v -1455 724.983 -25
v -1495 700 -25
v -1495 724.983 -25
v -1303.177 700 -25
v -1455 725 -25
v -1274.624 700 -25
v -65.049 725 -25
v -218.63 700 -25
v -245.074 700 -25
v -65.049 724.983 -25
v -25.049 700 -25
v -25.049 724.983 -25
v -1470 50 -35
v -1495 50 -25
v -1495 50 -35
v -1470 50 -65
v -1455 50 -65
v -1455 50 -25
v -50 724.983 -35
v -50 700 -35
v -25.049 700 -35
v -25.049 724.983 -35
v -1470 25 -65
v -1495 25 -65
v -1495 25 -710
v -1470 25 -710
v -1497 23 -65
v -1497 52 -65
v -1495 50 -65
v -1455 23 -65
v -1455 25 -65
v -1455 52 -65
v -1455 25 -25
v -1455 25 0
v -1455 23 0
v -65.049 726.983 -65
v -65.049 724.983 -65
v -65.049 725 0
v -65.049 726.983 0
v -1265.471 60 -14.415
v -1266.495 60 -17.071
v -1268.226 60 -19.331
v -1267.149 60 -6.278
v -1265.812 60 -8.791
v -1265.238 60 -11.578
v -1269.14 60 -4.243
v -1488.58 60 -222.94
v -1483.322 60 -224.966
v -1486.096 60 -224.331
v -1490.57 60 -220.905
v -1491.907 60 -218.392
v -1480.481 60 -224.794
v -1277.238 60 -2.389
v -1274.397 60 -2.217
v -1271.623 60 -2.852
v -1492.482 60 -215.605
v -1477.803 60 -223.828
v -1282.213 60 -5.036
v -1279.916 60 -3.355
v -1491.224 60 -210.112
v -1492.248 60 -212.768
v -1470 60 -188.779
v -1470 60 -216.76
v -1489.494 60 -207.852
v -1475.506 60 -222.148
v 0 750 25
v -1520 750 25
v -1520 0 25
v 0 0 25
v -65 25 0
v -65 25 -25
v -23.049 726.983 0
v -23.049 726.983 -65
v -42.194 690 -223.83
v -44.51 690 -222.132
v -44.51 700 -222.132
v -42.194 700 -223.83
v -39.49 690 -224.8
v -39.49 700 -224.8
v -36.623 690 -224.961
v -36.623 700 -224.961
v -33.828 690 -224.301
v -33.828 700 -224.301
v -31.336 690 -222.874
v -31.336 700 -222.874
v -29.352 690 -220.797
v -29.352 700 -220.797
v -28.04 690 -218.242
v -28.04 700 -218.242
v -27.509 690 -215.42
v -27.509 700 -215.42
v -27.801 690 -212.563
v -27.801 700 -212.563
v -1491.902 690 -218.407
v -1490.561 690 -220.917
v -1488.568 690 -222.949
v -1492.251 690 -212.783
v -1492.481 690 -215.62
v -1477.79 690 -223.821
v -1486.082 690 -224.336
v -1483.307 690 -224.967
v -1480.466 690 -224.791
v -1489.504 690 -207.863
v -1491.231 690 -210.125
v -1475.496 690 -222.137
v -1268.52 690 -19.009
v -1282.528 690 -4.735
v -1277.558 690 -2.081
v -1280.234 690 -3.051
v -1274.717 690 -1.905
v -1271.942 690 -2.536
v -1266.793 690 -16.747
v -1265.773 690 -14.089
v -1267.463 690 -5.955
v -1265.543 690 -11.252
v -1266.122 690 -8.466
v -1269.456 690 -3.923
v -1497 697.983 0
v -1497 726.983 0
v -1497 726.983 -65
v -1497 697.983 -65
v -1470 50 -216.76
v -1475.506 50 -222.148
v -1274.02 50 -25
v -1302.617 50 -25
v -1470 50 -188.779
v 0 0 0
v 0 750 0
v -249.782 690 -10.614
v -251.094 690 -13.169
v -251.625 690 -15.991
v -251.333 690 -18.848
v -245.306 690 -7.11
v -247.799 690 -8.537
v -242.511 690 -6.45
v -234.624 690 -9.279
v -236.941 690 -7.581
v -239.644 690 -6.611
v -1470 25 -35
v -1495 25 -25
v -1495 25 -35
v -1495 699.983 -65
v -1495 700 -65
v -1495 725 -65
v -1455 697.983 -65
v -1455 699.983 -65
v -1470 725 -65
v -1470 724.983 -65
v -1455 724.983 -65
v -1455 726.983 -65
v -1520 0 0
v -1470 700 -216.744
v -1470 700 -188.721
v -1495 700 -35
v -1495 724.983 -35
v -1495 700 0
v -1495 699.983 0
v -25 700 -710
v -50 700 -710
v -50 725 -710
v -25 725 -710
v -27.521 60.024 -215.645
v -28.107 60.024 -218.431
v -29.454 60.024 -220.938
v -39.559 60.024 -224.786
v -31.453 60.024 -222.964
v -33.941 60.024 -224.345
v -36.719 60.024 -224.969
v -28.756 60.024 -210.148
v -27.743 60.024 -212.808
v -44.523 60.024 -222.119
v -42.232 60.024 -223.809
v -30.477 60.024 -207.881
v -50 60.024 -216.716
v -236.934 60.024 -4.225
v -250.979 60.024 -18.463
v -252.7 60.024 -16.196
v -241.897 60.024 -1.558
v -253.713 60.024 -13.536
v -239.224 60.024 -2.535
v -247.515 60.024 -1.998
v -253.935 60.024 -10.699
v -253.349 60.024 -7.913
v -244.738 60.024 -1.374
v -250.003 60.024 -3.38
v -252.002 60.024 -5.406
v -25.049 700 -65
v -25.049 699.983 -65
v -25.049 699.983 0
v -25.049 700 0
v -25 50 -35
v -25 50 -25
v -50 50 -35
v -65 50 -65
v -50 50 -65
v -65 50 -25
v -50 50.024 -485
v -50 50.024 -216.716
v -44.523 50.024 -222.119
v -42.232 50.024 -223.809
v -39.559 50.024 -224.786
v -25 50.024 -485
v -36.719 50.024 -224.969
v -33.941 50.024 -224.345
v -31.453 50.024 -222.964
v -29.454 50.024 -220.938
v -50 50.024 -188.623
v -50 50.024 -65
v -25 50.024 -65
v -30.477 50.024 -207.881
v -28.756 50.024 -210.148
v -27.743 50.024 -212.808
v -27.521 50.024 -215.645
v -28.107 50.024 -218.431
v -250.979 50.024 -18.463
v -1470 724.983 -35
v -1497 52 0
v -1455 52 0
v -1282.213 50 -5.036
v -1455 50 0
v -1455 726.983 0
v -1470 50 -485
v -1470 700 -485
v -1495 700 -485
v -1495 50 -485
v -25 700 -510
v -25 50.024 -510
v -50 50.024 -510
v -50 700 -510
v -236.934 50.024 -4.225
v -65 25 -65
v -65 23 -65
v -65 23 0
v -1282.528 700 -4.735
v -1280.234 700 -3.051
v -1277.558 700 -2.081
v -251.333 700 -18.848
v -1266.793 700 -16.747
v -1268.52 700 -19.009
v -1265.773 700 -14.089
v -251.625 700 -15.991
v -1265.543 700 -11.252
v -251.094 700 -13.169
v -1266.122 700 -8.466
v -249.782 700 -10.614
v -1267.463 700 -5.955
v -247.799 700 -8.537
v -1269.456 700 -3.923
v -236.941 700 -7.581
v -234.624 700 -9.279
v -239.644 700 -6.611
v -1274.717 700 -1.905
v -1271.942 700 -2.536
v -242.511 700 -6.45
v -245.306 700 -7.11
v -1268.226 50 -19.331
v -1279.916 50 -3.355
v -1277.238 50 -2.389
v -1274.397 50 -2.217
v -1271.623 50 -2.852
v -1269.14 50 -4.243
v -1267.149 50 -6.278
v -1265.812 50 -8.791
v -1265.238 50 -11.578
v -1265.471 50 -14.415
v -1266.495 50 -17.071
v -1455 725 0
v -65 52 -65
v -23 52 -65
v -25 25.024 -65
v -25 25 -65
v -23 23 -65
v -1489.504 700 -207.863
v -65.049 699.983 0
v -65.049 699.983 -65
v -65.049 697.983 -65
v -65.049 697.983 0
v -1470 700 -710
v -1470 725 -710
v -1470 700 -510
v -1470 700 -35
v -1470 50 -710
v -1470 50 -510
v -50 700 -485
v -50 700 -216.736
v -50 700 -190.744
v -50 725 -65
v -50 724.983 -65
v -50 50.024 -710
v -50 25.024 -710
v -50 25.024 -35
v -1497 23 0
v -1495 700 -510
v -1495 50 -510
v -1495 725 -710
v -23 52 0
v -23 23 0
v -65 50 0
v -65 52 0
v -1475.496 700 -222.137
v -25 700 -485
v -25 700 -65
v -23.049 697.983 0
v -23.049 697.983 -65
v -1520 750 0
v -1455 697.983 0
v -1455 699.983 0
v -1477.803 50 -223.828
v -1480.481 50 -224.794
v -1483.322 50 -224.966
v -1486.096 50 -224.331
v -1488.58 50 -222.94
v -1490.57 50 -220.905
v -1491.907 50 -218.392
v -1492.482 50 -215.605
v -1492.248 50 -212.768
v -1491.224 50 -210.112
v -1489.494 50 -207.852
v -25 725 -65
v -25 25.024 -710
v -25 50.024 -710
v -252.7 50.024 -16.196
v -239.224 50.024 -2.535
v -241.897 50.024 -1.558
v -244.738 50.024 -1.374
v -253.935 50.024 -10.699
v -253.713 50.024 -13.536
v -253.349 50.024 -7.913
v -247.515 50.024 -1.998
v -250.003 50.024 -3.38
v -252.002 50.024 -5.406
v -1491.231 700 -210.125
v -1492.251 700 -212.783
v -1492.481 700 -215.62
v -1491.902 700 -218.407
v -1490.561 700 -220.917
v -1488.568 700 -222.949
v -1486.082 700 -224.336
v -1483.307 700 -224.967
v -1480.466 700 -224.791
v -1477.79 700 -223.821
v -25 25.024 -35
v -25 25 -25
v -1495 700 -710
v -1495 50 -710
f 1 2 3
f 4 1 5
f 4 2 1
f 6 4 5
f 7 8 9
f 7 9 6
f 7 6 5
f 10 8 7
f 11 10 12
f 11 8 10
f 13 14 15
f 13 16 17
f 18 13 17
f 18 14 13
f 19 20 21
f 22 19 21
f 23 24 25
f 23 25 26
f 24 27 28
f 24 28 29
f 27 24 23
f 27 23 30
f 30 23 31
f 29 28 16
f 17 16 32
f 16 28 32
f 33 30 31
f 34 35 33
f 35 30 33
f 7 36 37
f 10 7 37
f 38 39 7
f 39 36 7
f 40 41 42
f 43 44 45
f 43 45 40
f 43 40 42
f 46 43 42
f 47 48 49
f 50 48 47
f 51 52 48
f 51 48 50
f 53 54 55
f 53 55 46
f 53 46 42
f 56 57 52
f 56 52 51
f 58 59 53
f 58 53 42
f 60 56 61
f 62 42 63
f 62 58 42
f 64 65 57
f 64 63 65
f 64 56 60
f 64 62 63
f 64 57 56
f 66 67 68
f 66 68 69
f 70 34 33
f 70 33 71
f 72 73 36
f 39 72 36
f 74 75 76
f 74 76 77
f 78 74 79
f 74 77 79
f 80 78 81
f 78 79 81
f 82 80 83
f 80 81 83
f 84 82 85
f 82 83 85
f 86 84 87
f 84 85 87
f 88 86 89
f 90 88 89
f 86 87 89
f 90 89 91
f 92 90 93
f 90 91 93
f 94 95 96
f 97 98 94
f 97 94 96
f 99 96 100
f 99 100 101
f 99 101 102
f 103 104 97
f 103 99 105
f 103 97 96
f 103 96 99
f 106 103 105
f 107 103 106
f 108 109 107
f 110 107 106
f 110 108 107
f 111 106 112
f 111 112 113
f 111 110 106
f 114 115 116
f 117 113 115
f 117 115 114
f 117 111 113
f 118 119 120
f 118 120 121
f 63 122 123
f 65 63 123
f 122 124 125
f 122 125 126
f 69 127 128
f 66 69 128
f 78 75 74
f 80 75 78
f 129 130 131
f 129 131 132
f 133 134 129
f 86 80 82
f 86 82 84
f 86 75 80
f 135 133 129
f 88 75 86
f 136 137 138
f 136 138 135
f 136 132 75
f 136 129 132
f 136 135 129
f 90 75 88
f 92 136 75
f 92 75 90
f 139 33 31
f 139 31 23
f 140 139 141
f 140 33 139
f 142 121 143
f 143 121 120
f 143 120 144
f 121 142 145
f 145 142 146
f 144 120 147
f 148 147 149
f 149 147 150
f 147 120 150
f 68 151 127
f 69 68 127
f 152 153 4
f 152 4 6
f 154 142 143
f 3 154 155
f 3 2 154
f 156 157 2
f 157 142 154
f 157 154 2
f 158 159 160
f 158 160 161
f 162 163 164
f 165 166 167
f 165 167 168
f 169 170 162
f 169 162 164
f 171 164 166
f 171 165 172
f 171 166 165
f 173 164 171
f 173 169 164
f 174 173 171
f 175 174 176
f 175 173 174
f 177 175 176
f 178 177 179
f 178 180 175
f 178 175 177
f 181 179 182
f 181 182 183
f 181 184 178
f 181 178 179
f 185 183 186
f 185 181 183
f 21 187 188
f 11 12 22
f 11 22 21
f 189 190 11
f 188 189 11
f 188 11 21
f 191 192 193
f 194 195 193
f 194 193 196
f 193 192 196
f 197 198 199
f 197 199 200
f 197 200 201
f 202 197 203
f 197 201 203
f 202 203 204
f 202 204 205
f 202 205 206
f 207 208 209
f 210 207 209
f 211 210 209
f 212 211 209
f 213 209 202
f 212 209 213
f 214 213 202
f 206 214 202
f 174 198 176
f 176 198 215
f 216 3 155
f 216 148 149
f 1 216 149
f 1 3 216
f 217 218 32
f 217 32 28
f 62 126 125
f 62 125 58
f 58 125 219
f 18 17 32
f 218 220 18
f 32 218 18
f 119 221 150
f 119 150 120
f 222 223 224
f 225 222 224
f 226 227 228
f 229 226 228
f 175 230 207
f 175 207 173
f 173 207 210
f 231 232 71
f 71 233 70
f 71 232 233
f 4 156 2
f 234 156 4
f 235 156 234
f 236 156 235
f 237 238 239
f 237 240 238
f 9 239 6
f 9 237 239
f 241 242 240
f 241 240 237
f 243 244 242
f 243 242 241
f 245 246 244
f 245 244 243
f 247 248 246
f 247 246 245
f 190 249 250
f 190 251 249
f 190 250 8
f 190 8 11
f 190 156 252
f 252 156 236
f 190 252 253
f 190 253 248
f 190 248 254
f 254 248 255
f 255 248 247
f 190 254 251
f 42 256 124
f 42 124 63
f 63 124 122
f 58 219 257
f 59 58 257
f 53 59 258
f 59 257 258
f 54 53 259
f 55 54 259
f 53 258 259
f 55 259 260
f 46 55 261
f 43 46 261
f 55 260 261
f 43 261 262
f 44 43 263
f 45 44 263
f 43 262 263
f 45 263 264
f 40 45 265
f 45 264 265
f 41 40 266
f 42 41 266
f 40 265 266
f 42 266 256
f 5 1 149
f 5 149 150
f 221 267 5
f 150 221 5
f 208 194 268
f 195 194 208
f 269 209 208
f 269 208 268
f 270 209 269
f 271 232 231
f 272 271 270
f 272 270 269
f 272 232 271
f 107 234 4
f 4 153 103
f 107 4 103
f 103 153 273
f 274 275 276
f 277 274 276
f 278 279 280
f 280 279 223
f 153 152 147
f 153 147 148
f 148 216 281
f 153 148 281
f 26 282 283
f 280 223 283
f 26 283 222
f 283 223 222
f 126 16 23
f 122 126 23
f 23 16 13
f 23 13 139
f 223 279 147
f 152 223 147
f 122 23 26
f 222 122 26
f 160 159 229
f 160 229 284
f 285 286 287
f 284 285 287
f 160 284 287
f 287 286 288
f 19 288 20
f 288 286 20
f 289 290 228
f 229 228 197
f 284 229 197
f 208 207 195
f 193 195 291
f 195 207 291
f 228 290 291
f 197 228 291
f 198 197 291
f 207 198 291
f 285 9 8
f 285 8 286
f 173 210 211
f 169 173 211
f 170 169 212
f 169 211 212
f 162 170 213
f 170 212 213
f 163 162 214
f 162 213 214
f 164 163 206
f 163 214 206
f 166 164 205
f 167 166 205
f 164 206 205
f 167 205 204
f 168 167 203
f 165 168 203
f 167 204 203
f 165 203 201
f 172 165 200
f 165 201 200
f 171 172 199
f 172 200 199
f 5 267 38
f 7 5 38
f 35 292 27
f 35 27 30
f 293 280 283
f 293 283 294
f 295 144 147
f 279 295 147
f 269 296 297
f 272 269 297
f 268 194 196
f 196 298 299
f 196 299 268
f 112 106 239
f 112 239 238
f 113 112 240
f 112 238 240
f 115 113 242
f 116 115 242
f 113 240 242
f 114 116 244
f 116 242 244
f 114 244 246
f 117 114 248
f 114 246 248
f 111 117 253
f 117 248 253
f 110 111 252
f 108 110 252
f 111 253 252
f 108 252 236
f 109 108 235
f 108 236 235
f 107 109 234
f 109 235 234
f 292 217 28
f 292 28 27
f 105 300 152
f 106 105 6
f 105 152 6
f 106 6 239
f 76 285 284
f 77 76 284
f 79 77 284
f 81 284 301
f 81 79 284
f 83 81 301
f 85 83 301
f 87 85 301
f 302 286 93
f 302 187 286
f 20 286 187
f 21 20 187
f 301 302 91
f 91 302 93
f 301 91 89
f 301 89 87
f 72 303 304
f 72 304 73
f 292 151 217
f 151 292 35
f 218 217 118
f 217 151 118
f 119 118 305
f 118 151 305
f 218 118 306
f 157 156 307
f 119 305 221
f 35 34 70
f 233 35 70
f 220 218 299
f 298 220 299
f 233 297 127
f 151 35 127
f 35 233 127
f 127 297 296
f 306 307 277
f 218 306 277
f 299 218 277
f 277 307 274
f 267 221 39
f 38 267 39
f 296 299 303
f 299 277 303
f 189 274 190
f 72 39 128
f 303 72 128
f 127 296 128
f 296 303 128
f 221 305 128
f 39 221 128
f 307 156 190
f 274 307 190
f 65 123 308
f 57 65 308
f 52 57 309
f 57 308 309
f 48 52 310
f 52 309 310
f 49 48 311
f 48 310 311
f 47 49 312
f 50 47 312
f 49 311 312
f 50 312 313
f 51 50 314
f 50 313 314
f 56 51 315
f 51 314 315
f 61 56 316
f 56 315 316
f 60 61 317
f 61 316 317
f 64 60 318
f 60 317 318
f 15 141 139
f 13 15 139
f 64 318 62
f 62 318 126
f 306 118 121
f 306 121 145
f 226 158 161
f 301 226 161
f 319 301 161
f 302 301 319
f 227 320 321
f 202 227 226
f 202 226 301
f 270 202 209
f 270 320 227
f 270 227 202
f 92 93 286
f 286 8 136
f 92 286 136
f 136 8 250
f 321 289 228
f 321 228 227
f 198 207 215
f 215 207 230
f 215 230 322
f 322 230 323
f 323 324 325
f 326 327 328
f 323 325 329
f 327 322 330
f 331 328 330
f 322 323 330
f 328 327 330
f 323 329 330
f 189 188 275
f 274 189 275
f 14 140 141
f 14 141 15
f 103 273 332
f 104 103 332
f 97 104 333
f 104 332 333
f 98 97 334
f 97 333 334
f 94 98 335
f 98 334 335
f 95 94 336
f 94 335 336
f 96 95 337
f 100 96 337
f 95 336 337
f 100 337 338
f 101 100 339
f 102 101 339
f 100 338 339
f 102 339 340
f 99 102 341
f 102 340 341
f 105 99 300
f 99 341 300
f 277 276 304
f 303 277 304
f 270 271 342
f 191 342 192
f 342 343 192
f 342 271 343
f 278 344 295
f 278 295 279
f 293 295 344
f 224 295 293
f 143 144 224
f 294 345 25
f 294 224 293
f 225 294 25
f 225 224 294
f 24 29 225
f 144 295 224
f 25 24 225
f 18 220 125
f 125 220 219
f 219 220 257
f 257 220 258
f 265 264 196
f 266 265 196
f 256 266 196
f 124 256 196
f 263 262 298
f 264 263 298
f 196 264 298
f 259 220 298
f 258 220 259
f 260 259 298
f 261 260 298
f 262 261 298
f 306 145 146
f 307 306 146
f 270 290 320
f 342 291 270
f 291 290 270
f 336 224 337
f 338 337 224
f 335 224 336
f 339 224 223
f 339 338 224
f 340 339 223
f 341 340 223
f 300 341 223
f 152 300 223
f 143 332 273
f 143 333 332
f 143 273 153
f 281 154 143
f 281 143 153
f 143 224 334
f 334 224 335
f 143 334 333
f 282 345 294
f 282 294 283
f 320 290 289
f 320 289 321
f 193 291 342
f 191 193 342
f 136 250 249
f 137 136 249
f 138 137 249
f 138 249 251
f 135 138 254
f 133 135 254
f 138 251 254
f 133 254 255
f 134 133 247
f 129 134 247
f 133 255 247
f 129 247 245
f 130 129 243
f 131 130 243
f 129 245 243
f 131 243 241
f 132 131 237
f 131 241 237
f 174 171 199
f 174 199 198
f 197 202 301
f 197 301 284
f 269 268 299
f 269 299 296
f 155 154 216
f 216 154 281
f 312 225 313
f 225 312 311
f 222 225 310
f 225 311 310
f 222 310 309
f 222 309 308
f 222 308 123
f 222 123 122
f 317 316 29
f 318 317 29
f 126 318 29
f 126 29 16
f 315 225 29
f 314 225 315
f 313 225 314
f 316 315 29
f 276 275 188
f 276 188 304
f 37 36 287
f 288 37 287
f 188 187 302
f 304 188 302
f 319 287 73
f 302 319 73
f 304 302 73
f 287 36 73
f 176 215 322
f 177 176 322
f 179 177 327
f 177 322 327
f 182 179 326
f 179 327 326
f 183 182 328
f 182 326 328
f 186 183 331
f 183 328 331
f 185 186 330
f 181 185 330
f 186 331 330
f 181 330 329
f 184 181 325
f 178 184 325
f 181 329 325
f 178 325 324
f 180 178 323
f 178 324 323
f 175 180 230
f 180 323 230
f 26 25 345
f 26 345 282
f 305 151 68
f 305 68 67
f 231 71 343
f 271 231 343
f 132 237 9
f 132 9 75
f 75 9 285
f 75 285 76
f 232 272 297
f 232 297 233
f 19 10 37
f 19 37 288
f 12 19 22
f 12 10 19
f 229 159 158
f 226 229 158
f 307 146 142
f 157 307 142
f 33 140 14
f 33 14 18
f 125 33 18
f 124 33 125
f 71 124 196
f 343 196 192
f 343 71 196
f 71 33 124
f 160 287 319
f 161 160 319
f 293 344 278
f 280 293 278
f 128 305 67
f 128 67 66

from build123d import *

# Parameters (mm, degrees)
F0_W      = 1520
F0_H      = 750
F1_DEPTH  = 25
F2_W      = 1470
F2_H      = 25
F3_DEPTH  = 25
F5_DEPTH  = 65
F7_W      = 25
F7_H      = 25
F8_DEPTH  = 675
F10_DEPTH = 65
F12_W     = 25
F12_H     = 25
F13_DEPTH = 675
F15_W     = 25
F15_H     = 25
F16_DEPTH = 675
F18_W     = 25
F18_H     = 25
F19_DEPTH = 650
F21_W     = 25
F21_H     = 25
F22_DEPTH = 650
F24_DEPTH = 10
F26_DEPTH = 10
F29_DEPTH = 10
F31_DEPTH = 10


with BuildPart() as f1:
    # F0 (on Top) → F1 (new body)
    with BuildSketch(Plane.XY):
        with Locations((-760, 375)):
            Rectangle(F0_W, F0_H)
    extrude(amount=F1_DEPTH)

    # F2 (on face) → F3 (join)
    with BuildSketch(Plane(origin=(0, 0, 0), x_dir=(1, 0, 0), z_dir=(0, 0, -1))):
        with Locations((-760, -37.5)):
            Rectangle(F2_W, F2_H)
        with Locations((-760, -712.5)):
            Rectangle(F2_W, F2_H)
    extrude(amount=F3_DEPTH)

    # F4 (on face) → F5 (join)
    with BuildSketch(Plane(origin=(0, 0, 0), x_dir=(1, 0, 0), z_dir=(0, 0, -1))):
        Polygon((-65, -25), (-25, -25), (-25, -50), (-65, -50), (-65, -52), (-23, -52), (-23, -23), (-65, -23), align=None)
    extrude(amount=F5_DEPTH)

    # F7 (on offset) → F8 (join)
    with BuildSketch(Plane(origin=(0, 0, -35), x_dir=(1, 0, 0), z_dir=(0, 0, -1))):
        with Locations((-37.5, -37.523640207)):
            Rectangle(F7_W, F7_H)
    extrude(amount=F8_DEPTH)

    # F9 (on face) → F10 (join)
    with BuildSketch(Plane.XY):
        Polygon((-1495, 724.9829173088), (-1455, 724.9829173088), (-1455, 726.9829173088), (-1497, 726.9829173088), (-1497, 697.9829173088), (-1455, 697.9829173088), (-1455, 699.9829173088), (-1495, 699.9829173088), align=None)
        Polygon((-65.0490959734, 726.9829173088), (-65.0490959734, 724.9829173088), (-25.0490959734, 724.9829173088), (-25.0490959734, 699.9829173088), (-65.0490959734, 699.9829173088), (-65.0490959734, 697.9829173088), (-23.0490959734, 697.9829173088), (-23.0490959734, 726.9829173088), align=None)
        Polygon((-1455, 25), (-1495, 25), (-1495, 50), (-1455, 50), (-1455, 52), (-1497, 52), (-1497, 23), (-1455, 23), align=None)
    extrude(amount=-F10_DEPTH)

    # F12 (on offset) → F13 (join)
    with BuildSketch(Plane(origin=(0, 0, -35), x_dir=(1, 0, 0), z_dir=(0, 0, -1))):
        with Locations((-1482.5, -37.5)):
            Rectangle(F12_W, F12_H)
    extrude(amount=F13_DEPTH)

    # F15 (on offset) → F16 (join)
    with BuildSketch(Plane(origin=(0, 0, -35), x_dir=(1, 0, 0), z_dir=(0, 0, -1))):
        with Locations((-37.5, -712.5)):
            Rectangle(F15_W, F15_H)
        with Locations((-1482.5, -712.5)):
            Rectangle(F15_W, F15_H)
    extrude(amount=F16_DEPTH)

    # F18 (on offset) → F19 (join)
    with BuildSketch(Plane(origin=(0, 50.023640207, 0), x_dir=(-1, 0, 0), z_dir=(0, 1, 0))):
        with Locations((37.5, -497.5)):
            Rectangle(F18_W, F18_H)
    extrude(amount=F19_DEPTH)

    # F21 (on offset) → F22 (join)
    with BuildSketch(Plane(origin=(0, 50, 0), x_dir=(-1, 0, 0), z_dir=(0, 1, 0))):
        with Locations((1482.5, -497.5)):
            Rectangle(F21_W, F21_H)
    extrude(amount=F22_DEPTH)

    # F23 (on face) → F24 (join)
    with BuildSketch(Plane.XZ.offset(-700)):
        with BuildLine():
            Line((-50, -190.7444713597), (-234.6244849475, -9.2794851613))
            ThreePointArc((-234.6244849475, -9.2794851613), (-246.6039118675, -7.7336055545), (-251.332803081, -18.8481906111))
            Line((-251.332803081, -18.8481906111), (-50, -216.7355636904))
            Line((-50, -216.7355636904), (-50, -190.7444713597))
        make_face()
        with BuildLine():
            Line((-27.8014624786, -212.5631229112), (-50, -190.7444713597))
            Line((-50, -190.7444713597), (-50, -216.7355636904))
            Line((-50, -216.7355636904), (-44.5097806121, -222.131828361))
            ThreePointArc((-44.5097806121, -222.131828361), (-32.5303536921, -223.6777079678), (-27.8014624786, -212.5631229112))
        make_face()
    extrude(amount=F24_DEPTH)

    # F25 (on face) → F26 (join)
    with BuildSketch(Plane(origin=(0, 50.023640207, 0), x_dir=(-1, 0, 0), z_dir=(0, 1, 0))):
        with BuildLine():
            Line((50, -188.6229664357), (50, -216.7160920101))
            Line((50, -216.7160920101), (250.9788283543, -18.4630064225))
            ThreePointArc((250.9788283543, -18.4630064225), (251.07538107, -4.3212004002), (236.9335750477, -4.2246476845))
            Line((236.9335750477, -4.2246476845), (50, -188.6229664357))
        make_face()
        with BuildLine():
            ThreePointArc((30.4773733467, -207.880820631), (30.380820631, -222.0226266533), (44.5226266533, -222.119179369))
            Line((44.5226266533, -222.119179369), (50, -216.7160920101))
            Line((50, -216.7160920101), (50, -188.6229664357))
            Line((50, -188.6229664357), (30.4773733467, -207.880820631))
        make_face()
    extrude(amount=F26_DEPTH)

    # F28 (on offset) → F29 (join)
    with BuildSketch(Plane.XZ.offset(-700)):
        with BuildLine():
            ThreePointArc((-1268.519621658, -19.0091897955), (-1268.3869301053, -4.8676766886), (-1282.5284432121, -4.7349851358))
            Line((-1282.5284432121, -4.7349851358), (-1489.504410777, -207.8628976702))
            ThreePointArc((-1489.504410777, -207.8628976702), (-1489.6371023298, -222.004410777), (-1475.495589223, -222.1371023298))
            Line((-1475.495589223, -222.1371023298), (-1268.519621658, -19.0091897955))
        make_face()
    extrude(amount=F29_DEPTH)

    # F30 (on face) → F31 (join)
    with BuildSketch(Plane(origin=(0, 50, 0), x_dir=(-1, 0, 0), z_dir=(0, 1, 0))):
        with BuildLine():
            ThreePointArc((1475.506314972, -222.1476128693), (1489.6476128693, -221.993685028), (1489.493685028, -207.8523871307))
            Line((1489.493685028, -207.8523871307), (1470, -188.7785095141))
            Line((1470, -188.7785095141), (1470, -216.7598794703))
            Line((1470, -216.7598794703), (1475.506314972, -222.1476128693))
        make_face()
        with BuildLine():
            Line((1470, -216.7598794703), (1470, -188.7785095141))
            Line((1470, -188.7785095141), (1282.212911818, -5.0355213195))
            ThreePointArc((1282.212911818, -5.0355213195), (1268.0716139207, -5.1894491609), (1268.225541762, -19.3307470582))
            Line((1268.225541762, -19.3307470582), (1470, -216.7598794703))
        make_face()
    extrude(amount=F31_DEPTH)


solid = f1.part
